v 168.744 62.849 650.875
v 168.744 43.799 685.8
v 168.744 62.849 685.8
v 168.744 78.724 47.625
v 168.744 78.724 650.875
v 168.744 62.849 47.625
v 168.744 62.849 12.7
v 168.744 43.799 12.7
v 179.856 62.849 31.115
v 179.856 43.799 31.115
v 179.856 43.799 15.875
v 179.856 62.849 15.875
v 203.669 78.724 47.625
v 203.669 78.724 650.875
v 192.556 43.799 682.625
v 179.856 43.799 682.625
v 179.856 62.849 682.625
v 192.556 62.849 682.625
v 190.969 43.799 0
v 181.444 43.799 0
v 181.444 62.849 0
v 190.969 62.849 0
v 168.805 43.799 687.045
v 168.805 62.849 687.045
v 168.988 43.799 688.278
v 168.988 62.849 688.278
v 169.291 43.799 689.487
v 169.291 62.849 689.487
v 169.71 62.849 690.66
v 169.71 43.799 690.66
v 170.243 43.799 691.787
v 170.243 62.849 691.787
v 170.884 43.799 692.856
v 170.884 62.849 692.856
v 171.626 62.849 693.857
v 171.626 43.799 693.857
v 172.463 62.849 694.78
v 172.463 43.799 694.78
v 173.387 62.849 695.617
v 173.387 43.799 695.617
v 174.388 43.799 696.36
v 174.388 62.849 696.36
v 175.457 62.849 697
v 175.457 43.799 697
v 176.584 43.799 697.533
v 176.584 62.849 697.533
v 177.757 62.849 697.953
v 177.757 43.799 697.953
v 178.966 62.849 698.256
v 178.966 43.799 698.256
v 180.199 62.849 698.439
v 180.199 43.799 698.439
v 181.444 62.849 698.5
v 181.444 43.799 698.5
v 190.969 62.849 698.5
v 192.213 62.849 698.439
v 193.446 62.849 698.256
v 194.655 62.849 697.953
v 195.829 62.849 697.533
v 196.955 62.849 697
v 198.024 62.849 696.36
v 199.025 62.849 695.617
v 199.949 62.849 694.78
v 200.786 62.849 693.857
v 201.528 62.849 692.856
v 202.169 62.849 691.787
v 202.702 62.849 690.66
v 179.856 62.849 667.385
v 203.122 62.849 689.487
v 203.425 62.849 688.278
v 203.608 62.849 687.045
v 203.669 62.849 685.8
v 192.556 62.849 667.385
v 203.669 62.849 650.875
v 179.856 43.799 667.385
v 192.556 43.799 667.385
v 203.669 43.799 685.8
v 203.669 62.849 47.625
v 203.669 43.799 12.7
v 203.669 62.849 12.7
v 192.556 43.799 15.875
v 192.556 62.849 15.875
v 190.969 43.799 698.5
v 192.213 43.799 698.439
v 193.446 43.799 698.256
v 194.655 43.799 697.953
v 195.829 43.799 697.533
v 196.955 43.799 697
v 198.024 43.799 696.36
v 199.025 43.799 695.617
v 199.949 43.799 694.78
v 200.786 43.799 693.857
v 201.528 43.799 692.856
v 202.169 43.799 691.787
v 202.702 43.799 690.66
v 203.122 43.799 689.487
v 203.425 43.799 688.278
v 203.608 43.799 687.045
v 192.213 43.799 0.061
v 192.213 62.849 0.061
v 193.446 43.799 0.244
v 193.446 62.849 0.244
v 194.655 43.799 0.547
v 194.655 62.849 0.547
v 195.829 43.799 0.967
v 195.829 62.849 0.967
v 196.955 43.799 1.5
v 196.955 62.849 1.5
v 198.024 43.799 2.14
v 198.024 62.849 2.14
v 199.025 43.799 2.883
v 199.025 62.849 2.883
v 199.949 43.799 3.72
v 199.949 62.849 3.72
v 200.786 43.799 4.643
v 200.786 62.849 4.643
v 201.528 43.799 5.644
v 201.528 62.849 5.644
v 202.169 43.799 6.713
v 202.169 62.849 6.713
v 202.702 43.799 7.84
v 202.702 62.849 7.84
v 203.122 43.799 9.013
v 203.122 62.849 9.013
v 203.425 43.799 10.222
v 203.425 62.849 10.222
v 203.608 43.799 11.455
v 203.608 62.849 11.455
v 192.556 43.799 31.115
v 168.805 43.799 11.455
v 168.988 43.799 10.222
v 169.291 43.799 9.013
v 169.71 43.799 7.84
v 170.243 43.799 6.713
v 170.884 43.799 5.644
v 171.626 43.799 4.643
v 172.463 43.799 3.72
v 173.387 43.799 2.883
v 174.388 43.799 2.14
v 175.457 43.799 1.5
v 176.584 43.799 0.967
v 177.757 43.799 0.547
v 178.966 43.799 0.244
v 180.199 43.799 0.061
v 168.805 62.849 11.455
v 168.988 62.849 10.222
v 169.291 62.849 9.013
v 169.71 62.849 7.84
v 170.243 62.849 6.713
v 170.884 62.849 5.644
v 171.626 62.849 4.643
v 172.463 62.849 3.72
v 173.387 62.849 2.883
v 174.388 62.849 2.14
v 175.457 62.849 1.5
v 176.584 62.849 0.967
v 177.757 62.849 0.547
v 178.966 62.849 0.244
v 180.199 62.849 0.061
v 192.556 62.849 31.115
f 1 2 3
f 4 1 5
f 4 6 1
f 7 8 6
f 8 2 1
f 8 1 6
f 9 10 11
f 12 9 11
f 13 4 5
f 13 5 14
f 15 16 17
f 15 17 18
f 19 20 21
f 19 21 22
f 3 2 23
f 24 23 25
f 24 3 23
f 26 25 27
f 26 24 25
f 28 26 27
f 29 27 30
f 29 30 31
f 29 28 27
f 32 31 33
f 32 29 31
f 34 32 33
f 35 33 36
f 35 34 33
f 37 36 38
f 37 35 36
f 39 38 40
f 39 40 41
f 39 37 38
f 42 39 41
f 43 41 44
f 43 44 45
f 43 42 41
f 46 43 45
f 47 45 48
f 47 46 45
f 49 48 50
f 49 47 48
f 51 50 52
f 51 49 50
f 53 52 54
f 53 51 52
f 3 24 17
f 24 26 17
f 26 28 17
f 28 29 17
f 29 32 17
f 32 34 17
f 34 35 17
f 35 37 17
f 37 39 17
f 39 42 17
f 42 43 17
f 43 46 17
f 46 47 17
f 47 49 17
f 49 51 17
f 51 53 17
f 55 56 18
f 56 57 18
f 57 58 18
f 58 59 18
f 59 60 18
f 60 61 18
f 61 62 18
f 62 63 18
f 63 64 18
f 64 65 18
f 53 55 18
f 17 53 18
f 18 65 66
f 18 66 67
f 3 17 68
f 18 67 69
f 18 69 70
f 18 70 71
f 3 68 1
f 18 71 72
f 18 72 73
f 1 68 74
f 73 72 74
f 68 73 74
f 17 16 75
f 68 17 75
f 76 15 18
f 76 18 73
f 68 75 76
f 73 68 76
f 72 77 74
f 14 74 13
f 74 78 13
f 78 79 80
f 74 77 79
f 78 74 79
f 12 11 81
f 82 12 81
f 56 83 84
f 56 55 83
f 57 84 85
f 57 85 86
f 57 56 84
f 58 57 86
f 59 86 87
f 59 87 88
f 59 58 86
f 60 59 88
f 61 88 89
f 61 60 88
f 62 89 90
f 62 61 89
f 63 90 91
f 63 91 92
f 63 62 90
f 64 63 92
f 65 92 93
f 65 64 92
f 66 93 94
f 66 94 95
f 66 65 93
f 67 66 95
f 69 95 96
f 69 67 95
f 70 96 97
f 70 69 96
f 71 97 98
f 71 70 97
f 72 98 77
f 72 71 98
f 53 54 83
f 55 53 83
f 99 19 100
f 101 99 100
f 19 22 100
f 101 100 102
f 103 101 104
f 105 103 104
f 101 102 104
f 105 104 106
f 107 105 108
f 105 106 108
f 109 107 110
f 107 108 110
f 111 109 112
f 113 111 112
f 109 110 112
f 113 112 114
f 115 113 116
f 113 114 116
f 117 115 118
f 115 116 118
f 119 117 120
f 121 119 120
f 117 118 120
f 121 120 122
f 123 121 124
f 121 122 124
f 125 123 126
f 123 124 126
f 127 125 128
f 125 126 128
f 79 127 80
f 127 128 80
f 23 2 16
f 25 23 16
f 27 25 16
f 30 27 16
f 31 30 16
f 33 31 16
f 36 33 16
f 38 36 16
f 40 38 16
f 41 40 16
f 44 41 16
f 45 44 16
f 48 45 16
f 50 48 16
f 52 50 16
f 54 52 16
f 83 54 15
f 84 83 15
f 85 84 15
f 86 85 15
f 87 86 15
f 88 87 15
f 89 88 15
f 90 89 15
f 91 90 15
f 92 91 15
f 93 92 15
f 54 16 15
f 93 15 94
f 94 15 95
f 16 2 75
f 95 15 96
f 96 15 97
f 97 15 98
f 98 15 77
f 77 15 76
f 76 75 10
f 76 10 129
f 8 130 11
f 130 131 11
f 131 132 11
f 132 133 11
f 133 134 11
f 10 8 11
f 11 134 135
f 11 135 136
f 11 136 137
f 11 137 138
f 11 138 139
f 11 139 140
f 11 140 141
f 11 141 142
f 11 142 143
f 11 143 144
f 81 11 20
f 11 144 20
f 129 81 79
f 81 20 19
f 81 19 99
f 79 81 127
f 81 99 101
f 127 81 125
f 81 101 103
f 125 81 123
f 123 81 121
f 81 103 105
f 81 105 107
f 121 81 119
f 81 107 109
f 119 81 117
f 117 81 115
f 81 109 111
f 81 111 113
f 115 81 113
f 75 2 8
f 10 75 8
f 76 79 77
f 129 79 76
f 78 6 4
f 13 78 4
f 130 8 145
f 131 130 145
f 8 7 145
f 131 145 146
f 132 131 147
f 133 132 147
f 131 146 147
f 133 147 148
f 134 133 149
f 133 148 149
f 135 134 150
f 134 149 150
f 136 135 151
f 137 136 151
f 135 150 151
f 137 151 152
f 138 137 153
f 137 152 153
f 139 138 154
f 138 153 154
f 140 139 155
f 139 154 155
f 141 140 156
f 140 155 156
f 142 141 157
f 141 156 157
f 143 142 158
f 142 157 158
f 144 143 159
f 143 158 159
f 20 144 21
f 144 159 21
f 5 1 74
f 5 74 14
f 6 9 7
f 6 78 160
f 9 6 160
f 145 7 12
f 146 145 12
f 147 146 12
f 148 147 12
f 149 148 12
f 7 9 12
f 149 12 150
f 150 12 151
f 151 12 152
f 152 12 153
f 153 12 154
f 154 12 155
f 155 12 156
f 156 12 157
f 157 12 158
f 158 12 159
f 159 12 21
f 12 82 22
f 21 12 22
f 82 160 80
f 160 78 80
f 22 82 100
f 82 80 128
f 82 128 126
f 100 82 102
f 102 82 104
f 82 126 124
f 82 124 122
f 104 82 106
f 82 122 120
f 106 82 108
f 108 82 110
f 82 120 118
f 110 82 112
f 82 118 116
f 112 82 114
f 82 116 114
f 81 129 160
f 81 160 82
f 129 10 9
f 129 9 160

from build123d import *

# Parameters (mm, degrees)
SKETCH1_W           = 34.925
SKETCH1_H           = 34.925
BOSS_EXTRUDE1_DEPTH = 698.5
SKETCH2_W           = 47.625
SKETCH2_H           = 15.875
CUT_EXTRUDE1_DEPTH  = 127
SKETCH3_W           = 12.7
SKETCH3_H           = 15.24
CUT_EXTRUDE2_DEPTH  = 728.836573147
FILLET1_R           = 12.7


with BuildPart() as part:
    # Sketch1 → Boss-Extrude1 (new body)
    with BuildSketch(Plane.XY):
        with Locations((186.206164037, 61.261572703)):
            Rectangle(SKETCH1_W, SKETCH1_H)
    extrude(amount=BOSS_EXTRUDE1_DEPTH)

    # Sketch2 → Cut-Extrude1 (cut)
    with BuildSketch(Plane(origin=(203.668664037, 0, 0), x_dir=(0, 0, -1), z_dir=(1, 0, 0))):
        with Locations((-23.8125, 70.786572703)):
            Rectangle(SKETCH2_W, SKETCH2_H)
        with Locations((-674.6875, 70.786572703)):
            Rectangle(SKETCH2_W, SKETCH2_H)
    extrude(amount=-CUT_EXTRUDE1_DEPTH, mode=Mode.SUBTRACT)

    # Sketch3 → Cut-Extrude2 (cut, through all)
    with BuildSketch(Plane(origin=(0, 62.849072703, 0), x_dir=(1, 0, 0), z_dir=(0, 1, 0))):
        with Locations((186.206164037, -675.005)):
            Rectangle(SKETCH3_W, SKETCH3_H)
        with Locations((186.206164037, -23.495)):
            Rectangle(SKETCH3_W, SKETCH3_H)
    extrude(amount=-CUT_EXTRUDE2_DEPTH, mode=Mode.SUBTRACT)

    # Fillet1
    fillet1_edges = [part.edges().sort_by_distance(p)[0] for p in [
        (203.668664037, 53.324072703, 698.5),
        (168.743664037, 53.324072703, 698.5),
        (168.743664037, 53.324072703, 0),
        (203.668664037, 53.324072703, 0),
    ]]
    fillet(fillet1_edges, radius=FILLET1_R)


solid = part.part
